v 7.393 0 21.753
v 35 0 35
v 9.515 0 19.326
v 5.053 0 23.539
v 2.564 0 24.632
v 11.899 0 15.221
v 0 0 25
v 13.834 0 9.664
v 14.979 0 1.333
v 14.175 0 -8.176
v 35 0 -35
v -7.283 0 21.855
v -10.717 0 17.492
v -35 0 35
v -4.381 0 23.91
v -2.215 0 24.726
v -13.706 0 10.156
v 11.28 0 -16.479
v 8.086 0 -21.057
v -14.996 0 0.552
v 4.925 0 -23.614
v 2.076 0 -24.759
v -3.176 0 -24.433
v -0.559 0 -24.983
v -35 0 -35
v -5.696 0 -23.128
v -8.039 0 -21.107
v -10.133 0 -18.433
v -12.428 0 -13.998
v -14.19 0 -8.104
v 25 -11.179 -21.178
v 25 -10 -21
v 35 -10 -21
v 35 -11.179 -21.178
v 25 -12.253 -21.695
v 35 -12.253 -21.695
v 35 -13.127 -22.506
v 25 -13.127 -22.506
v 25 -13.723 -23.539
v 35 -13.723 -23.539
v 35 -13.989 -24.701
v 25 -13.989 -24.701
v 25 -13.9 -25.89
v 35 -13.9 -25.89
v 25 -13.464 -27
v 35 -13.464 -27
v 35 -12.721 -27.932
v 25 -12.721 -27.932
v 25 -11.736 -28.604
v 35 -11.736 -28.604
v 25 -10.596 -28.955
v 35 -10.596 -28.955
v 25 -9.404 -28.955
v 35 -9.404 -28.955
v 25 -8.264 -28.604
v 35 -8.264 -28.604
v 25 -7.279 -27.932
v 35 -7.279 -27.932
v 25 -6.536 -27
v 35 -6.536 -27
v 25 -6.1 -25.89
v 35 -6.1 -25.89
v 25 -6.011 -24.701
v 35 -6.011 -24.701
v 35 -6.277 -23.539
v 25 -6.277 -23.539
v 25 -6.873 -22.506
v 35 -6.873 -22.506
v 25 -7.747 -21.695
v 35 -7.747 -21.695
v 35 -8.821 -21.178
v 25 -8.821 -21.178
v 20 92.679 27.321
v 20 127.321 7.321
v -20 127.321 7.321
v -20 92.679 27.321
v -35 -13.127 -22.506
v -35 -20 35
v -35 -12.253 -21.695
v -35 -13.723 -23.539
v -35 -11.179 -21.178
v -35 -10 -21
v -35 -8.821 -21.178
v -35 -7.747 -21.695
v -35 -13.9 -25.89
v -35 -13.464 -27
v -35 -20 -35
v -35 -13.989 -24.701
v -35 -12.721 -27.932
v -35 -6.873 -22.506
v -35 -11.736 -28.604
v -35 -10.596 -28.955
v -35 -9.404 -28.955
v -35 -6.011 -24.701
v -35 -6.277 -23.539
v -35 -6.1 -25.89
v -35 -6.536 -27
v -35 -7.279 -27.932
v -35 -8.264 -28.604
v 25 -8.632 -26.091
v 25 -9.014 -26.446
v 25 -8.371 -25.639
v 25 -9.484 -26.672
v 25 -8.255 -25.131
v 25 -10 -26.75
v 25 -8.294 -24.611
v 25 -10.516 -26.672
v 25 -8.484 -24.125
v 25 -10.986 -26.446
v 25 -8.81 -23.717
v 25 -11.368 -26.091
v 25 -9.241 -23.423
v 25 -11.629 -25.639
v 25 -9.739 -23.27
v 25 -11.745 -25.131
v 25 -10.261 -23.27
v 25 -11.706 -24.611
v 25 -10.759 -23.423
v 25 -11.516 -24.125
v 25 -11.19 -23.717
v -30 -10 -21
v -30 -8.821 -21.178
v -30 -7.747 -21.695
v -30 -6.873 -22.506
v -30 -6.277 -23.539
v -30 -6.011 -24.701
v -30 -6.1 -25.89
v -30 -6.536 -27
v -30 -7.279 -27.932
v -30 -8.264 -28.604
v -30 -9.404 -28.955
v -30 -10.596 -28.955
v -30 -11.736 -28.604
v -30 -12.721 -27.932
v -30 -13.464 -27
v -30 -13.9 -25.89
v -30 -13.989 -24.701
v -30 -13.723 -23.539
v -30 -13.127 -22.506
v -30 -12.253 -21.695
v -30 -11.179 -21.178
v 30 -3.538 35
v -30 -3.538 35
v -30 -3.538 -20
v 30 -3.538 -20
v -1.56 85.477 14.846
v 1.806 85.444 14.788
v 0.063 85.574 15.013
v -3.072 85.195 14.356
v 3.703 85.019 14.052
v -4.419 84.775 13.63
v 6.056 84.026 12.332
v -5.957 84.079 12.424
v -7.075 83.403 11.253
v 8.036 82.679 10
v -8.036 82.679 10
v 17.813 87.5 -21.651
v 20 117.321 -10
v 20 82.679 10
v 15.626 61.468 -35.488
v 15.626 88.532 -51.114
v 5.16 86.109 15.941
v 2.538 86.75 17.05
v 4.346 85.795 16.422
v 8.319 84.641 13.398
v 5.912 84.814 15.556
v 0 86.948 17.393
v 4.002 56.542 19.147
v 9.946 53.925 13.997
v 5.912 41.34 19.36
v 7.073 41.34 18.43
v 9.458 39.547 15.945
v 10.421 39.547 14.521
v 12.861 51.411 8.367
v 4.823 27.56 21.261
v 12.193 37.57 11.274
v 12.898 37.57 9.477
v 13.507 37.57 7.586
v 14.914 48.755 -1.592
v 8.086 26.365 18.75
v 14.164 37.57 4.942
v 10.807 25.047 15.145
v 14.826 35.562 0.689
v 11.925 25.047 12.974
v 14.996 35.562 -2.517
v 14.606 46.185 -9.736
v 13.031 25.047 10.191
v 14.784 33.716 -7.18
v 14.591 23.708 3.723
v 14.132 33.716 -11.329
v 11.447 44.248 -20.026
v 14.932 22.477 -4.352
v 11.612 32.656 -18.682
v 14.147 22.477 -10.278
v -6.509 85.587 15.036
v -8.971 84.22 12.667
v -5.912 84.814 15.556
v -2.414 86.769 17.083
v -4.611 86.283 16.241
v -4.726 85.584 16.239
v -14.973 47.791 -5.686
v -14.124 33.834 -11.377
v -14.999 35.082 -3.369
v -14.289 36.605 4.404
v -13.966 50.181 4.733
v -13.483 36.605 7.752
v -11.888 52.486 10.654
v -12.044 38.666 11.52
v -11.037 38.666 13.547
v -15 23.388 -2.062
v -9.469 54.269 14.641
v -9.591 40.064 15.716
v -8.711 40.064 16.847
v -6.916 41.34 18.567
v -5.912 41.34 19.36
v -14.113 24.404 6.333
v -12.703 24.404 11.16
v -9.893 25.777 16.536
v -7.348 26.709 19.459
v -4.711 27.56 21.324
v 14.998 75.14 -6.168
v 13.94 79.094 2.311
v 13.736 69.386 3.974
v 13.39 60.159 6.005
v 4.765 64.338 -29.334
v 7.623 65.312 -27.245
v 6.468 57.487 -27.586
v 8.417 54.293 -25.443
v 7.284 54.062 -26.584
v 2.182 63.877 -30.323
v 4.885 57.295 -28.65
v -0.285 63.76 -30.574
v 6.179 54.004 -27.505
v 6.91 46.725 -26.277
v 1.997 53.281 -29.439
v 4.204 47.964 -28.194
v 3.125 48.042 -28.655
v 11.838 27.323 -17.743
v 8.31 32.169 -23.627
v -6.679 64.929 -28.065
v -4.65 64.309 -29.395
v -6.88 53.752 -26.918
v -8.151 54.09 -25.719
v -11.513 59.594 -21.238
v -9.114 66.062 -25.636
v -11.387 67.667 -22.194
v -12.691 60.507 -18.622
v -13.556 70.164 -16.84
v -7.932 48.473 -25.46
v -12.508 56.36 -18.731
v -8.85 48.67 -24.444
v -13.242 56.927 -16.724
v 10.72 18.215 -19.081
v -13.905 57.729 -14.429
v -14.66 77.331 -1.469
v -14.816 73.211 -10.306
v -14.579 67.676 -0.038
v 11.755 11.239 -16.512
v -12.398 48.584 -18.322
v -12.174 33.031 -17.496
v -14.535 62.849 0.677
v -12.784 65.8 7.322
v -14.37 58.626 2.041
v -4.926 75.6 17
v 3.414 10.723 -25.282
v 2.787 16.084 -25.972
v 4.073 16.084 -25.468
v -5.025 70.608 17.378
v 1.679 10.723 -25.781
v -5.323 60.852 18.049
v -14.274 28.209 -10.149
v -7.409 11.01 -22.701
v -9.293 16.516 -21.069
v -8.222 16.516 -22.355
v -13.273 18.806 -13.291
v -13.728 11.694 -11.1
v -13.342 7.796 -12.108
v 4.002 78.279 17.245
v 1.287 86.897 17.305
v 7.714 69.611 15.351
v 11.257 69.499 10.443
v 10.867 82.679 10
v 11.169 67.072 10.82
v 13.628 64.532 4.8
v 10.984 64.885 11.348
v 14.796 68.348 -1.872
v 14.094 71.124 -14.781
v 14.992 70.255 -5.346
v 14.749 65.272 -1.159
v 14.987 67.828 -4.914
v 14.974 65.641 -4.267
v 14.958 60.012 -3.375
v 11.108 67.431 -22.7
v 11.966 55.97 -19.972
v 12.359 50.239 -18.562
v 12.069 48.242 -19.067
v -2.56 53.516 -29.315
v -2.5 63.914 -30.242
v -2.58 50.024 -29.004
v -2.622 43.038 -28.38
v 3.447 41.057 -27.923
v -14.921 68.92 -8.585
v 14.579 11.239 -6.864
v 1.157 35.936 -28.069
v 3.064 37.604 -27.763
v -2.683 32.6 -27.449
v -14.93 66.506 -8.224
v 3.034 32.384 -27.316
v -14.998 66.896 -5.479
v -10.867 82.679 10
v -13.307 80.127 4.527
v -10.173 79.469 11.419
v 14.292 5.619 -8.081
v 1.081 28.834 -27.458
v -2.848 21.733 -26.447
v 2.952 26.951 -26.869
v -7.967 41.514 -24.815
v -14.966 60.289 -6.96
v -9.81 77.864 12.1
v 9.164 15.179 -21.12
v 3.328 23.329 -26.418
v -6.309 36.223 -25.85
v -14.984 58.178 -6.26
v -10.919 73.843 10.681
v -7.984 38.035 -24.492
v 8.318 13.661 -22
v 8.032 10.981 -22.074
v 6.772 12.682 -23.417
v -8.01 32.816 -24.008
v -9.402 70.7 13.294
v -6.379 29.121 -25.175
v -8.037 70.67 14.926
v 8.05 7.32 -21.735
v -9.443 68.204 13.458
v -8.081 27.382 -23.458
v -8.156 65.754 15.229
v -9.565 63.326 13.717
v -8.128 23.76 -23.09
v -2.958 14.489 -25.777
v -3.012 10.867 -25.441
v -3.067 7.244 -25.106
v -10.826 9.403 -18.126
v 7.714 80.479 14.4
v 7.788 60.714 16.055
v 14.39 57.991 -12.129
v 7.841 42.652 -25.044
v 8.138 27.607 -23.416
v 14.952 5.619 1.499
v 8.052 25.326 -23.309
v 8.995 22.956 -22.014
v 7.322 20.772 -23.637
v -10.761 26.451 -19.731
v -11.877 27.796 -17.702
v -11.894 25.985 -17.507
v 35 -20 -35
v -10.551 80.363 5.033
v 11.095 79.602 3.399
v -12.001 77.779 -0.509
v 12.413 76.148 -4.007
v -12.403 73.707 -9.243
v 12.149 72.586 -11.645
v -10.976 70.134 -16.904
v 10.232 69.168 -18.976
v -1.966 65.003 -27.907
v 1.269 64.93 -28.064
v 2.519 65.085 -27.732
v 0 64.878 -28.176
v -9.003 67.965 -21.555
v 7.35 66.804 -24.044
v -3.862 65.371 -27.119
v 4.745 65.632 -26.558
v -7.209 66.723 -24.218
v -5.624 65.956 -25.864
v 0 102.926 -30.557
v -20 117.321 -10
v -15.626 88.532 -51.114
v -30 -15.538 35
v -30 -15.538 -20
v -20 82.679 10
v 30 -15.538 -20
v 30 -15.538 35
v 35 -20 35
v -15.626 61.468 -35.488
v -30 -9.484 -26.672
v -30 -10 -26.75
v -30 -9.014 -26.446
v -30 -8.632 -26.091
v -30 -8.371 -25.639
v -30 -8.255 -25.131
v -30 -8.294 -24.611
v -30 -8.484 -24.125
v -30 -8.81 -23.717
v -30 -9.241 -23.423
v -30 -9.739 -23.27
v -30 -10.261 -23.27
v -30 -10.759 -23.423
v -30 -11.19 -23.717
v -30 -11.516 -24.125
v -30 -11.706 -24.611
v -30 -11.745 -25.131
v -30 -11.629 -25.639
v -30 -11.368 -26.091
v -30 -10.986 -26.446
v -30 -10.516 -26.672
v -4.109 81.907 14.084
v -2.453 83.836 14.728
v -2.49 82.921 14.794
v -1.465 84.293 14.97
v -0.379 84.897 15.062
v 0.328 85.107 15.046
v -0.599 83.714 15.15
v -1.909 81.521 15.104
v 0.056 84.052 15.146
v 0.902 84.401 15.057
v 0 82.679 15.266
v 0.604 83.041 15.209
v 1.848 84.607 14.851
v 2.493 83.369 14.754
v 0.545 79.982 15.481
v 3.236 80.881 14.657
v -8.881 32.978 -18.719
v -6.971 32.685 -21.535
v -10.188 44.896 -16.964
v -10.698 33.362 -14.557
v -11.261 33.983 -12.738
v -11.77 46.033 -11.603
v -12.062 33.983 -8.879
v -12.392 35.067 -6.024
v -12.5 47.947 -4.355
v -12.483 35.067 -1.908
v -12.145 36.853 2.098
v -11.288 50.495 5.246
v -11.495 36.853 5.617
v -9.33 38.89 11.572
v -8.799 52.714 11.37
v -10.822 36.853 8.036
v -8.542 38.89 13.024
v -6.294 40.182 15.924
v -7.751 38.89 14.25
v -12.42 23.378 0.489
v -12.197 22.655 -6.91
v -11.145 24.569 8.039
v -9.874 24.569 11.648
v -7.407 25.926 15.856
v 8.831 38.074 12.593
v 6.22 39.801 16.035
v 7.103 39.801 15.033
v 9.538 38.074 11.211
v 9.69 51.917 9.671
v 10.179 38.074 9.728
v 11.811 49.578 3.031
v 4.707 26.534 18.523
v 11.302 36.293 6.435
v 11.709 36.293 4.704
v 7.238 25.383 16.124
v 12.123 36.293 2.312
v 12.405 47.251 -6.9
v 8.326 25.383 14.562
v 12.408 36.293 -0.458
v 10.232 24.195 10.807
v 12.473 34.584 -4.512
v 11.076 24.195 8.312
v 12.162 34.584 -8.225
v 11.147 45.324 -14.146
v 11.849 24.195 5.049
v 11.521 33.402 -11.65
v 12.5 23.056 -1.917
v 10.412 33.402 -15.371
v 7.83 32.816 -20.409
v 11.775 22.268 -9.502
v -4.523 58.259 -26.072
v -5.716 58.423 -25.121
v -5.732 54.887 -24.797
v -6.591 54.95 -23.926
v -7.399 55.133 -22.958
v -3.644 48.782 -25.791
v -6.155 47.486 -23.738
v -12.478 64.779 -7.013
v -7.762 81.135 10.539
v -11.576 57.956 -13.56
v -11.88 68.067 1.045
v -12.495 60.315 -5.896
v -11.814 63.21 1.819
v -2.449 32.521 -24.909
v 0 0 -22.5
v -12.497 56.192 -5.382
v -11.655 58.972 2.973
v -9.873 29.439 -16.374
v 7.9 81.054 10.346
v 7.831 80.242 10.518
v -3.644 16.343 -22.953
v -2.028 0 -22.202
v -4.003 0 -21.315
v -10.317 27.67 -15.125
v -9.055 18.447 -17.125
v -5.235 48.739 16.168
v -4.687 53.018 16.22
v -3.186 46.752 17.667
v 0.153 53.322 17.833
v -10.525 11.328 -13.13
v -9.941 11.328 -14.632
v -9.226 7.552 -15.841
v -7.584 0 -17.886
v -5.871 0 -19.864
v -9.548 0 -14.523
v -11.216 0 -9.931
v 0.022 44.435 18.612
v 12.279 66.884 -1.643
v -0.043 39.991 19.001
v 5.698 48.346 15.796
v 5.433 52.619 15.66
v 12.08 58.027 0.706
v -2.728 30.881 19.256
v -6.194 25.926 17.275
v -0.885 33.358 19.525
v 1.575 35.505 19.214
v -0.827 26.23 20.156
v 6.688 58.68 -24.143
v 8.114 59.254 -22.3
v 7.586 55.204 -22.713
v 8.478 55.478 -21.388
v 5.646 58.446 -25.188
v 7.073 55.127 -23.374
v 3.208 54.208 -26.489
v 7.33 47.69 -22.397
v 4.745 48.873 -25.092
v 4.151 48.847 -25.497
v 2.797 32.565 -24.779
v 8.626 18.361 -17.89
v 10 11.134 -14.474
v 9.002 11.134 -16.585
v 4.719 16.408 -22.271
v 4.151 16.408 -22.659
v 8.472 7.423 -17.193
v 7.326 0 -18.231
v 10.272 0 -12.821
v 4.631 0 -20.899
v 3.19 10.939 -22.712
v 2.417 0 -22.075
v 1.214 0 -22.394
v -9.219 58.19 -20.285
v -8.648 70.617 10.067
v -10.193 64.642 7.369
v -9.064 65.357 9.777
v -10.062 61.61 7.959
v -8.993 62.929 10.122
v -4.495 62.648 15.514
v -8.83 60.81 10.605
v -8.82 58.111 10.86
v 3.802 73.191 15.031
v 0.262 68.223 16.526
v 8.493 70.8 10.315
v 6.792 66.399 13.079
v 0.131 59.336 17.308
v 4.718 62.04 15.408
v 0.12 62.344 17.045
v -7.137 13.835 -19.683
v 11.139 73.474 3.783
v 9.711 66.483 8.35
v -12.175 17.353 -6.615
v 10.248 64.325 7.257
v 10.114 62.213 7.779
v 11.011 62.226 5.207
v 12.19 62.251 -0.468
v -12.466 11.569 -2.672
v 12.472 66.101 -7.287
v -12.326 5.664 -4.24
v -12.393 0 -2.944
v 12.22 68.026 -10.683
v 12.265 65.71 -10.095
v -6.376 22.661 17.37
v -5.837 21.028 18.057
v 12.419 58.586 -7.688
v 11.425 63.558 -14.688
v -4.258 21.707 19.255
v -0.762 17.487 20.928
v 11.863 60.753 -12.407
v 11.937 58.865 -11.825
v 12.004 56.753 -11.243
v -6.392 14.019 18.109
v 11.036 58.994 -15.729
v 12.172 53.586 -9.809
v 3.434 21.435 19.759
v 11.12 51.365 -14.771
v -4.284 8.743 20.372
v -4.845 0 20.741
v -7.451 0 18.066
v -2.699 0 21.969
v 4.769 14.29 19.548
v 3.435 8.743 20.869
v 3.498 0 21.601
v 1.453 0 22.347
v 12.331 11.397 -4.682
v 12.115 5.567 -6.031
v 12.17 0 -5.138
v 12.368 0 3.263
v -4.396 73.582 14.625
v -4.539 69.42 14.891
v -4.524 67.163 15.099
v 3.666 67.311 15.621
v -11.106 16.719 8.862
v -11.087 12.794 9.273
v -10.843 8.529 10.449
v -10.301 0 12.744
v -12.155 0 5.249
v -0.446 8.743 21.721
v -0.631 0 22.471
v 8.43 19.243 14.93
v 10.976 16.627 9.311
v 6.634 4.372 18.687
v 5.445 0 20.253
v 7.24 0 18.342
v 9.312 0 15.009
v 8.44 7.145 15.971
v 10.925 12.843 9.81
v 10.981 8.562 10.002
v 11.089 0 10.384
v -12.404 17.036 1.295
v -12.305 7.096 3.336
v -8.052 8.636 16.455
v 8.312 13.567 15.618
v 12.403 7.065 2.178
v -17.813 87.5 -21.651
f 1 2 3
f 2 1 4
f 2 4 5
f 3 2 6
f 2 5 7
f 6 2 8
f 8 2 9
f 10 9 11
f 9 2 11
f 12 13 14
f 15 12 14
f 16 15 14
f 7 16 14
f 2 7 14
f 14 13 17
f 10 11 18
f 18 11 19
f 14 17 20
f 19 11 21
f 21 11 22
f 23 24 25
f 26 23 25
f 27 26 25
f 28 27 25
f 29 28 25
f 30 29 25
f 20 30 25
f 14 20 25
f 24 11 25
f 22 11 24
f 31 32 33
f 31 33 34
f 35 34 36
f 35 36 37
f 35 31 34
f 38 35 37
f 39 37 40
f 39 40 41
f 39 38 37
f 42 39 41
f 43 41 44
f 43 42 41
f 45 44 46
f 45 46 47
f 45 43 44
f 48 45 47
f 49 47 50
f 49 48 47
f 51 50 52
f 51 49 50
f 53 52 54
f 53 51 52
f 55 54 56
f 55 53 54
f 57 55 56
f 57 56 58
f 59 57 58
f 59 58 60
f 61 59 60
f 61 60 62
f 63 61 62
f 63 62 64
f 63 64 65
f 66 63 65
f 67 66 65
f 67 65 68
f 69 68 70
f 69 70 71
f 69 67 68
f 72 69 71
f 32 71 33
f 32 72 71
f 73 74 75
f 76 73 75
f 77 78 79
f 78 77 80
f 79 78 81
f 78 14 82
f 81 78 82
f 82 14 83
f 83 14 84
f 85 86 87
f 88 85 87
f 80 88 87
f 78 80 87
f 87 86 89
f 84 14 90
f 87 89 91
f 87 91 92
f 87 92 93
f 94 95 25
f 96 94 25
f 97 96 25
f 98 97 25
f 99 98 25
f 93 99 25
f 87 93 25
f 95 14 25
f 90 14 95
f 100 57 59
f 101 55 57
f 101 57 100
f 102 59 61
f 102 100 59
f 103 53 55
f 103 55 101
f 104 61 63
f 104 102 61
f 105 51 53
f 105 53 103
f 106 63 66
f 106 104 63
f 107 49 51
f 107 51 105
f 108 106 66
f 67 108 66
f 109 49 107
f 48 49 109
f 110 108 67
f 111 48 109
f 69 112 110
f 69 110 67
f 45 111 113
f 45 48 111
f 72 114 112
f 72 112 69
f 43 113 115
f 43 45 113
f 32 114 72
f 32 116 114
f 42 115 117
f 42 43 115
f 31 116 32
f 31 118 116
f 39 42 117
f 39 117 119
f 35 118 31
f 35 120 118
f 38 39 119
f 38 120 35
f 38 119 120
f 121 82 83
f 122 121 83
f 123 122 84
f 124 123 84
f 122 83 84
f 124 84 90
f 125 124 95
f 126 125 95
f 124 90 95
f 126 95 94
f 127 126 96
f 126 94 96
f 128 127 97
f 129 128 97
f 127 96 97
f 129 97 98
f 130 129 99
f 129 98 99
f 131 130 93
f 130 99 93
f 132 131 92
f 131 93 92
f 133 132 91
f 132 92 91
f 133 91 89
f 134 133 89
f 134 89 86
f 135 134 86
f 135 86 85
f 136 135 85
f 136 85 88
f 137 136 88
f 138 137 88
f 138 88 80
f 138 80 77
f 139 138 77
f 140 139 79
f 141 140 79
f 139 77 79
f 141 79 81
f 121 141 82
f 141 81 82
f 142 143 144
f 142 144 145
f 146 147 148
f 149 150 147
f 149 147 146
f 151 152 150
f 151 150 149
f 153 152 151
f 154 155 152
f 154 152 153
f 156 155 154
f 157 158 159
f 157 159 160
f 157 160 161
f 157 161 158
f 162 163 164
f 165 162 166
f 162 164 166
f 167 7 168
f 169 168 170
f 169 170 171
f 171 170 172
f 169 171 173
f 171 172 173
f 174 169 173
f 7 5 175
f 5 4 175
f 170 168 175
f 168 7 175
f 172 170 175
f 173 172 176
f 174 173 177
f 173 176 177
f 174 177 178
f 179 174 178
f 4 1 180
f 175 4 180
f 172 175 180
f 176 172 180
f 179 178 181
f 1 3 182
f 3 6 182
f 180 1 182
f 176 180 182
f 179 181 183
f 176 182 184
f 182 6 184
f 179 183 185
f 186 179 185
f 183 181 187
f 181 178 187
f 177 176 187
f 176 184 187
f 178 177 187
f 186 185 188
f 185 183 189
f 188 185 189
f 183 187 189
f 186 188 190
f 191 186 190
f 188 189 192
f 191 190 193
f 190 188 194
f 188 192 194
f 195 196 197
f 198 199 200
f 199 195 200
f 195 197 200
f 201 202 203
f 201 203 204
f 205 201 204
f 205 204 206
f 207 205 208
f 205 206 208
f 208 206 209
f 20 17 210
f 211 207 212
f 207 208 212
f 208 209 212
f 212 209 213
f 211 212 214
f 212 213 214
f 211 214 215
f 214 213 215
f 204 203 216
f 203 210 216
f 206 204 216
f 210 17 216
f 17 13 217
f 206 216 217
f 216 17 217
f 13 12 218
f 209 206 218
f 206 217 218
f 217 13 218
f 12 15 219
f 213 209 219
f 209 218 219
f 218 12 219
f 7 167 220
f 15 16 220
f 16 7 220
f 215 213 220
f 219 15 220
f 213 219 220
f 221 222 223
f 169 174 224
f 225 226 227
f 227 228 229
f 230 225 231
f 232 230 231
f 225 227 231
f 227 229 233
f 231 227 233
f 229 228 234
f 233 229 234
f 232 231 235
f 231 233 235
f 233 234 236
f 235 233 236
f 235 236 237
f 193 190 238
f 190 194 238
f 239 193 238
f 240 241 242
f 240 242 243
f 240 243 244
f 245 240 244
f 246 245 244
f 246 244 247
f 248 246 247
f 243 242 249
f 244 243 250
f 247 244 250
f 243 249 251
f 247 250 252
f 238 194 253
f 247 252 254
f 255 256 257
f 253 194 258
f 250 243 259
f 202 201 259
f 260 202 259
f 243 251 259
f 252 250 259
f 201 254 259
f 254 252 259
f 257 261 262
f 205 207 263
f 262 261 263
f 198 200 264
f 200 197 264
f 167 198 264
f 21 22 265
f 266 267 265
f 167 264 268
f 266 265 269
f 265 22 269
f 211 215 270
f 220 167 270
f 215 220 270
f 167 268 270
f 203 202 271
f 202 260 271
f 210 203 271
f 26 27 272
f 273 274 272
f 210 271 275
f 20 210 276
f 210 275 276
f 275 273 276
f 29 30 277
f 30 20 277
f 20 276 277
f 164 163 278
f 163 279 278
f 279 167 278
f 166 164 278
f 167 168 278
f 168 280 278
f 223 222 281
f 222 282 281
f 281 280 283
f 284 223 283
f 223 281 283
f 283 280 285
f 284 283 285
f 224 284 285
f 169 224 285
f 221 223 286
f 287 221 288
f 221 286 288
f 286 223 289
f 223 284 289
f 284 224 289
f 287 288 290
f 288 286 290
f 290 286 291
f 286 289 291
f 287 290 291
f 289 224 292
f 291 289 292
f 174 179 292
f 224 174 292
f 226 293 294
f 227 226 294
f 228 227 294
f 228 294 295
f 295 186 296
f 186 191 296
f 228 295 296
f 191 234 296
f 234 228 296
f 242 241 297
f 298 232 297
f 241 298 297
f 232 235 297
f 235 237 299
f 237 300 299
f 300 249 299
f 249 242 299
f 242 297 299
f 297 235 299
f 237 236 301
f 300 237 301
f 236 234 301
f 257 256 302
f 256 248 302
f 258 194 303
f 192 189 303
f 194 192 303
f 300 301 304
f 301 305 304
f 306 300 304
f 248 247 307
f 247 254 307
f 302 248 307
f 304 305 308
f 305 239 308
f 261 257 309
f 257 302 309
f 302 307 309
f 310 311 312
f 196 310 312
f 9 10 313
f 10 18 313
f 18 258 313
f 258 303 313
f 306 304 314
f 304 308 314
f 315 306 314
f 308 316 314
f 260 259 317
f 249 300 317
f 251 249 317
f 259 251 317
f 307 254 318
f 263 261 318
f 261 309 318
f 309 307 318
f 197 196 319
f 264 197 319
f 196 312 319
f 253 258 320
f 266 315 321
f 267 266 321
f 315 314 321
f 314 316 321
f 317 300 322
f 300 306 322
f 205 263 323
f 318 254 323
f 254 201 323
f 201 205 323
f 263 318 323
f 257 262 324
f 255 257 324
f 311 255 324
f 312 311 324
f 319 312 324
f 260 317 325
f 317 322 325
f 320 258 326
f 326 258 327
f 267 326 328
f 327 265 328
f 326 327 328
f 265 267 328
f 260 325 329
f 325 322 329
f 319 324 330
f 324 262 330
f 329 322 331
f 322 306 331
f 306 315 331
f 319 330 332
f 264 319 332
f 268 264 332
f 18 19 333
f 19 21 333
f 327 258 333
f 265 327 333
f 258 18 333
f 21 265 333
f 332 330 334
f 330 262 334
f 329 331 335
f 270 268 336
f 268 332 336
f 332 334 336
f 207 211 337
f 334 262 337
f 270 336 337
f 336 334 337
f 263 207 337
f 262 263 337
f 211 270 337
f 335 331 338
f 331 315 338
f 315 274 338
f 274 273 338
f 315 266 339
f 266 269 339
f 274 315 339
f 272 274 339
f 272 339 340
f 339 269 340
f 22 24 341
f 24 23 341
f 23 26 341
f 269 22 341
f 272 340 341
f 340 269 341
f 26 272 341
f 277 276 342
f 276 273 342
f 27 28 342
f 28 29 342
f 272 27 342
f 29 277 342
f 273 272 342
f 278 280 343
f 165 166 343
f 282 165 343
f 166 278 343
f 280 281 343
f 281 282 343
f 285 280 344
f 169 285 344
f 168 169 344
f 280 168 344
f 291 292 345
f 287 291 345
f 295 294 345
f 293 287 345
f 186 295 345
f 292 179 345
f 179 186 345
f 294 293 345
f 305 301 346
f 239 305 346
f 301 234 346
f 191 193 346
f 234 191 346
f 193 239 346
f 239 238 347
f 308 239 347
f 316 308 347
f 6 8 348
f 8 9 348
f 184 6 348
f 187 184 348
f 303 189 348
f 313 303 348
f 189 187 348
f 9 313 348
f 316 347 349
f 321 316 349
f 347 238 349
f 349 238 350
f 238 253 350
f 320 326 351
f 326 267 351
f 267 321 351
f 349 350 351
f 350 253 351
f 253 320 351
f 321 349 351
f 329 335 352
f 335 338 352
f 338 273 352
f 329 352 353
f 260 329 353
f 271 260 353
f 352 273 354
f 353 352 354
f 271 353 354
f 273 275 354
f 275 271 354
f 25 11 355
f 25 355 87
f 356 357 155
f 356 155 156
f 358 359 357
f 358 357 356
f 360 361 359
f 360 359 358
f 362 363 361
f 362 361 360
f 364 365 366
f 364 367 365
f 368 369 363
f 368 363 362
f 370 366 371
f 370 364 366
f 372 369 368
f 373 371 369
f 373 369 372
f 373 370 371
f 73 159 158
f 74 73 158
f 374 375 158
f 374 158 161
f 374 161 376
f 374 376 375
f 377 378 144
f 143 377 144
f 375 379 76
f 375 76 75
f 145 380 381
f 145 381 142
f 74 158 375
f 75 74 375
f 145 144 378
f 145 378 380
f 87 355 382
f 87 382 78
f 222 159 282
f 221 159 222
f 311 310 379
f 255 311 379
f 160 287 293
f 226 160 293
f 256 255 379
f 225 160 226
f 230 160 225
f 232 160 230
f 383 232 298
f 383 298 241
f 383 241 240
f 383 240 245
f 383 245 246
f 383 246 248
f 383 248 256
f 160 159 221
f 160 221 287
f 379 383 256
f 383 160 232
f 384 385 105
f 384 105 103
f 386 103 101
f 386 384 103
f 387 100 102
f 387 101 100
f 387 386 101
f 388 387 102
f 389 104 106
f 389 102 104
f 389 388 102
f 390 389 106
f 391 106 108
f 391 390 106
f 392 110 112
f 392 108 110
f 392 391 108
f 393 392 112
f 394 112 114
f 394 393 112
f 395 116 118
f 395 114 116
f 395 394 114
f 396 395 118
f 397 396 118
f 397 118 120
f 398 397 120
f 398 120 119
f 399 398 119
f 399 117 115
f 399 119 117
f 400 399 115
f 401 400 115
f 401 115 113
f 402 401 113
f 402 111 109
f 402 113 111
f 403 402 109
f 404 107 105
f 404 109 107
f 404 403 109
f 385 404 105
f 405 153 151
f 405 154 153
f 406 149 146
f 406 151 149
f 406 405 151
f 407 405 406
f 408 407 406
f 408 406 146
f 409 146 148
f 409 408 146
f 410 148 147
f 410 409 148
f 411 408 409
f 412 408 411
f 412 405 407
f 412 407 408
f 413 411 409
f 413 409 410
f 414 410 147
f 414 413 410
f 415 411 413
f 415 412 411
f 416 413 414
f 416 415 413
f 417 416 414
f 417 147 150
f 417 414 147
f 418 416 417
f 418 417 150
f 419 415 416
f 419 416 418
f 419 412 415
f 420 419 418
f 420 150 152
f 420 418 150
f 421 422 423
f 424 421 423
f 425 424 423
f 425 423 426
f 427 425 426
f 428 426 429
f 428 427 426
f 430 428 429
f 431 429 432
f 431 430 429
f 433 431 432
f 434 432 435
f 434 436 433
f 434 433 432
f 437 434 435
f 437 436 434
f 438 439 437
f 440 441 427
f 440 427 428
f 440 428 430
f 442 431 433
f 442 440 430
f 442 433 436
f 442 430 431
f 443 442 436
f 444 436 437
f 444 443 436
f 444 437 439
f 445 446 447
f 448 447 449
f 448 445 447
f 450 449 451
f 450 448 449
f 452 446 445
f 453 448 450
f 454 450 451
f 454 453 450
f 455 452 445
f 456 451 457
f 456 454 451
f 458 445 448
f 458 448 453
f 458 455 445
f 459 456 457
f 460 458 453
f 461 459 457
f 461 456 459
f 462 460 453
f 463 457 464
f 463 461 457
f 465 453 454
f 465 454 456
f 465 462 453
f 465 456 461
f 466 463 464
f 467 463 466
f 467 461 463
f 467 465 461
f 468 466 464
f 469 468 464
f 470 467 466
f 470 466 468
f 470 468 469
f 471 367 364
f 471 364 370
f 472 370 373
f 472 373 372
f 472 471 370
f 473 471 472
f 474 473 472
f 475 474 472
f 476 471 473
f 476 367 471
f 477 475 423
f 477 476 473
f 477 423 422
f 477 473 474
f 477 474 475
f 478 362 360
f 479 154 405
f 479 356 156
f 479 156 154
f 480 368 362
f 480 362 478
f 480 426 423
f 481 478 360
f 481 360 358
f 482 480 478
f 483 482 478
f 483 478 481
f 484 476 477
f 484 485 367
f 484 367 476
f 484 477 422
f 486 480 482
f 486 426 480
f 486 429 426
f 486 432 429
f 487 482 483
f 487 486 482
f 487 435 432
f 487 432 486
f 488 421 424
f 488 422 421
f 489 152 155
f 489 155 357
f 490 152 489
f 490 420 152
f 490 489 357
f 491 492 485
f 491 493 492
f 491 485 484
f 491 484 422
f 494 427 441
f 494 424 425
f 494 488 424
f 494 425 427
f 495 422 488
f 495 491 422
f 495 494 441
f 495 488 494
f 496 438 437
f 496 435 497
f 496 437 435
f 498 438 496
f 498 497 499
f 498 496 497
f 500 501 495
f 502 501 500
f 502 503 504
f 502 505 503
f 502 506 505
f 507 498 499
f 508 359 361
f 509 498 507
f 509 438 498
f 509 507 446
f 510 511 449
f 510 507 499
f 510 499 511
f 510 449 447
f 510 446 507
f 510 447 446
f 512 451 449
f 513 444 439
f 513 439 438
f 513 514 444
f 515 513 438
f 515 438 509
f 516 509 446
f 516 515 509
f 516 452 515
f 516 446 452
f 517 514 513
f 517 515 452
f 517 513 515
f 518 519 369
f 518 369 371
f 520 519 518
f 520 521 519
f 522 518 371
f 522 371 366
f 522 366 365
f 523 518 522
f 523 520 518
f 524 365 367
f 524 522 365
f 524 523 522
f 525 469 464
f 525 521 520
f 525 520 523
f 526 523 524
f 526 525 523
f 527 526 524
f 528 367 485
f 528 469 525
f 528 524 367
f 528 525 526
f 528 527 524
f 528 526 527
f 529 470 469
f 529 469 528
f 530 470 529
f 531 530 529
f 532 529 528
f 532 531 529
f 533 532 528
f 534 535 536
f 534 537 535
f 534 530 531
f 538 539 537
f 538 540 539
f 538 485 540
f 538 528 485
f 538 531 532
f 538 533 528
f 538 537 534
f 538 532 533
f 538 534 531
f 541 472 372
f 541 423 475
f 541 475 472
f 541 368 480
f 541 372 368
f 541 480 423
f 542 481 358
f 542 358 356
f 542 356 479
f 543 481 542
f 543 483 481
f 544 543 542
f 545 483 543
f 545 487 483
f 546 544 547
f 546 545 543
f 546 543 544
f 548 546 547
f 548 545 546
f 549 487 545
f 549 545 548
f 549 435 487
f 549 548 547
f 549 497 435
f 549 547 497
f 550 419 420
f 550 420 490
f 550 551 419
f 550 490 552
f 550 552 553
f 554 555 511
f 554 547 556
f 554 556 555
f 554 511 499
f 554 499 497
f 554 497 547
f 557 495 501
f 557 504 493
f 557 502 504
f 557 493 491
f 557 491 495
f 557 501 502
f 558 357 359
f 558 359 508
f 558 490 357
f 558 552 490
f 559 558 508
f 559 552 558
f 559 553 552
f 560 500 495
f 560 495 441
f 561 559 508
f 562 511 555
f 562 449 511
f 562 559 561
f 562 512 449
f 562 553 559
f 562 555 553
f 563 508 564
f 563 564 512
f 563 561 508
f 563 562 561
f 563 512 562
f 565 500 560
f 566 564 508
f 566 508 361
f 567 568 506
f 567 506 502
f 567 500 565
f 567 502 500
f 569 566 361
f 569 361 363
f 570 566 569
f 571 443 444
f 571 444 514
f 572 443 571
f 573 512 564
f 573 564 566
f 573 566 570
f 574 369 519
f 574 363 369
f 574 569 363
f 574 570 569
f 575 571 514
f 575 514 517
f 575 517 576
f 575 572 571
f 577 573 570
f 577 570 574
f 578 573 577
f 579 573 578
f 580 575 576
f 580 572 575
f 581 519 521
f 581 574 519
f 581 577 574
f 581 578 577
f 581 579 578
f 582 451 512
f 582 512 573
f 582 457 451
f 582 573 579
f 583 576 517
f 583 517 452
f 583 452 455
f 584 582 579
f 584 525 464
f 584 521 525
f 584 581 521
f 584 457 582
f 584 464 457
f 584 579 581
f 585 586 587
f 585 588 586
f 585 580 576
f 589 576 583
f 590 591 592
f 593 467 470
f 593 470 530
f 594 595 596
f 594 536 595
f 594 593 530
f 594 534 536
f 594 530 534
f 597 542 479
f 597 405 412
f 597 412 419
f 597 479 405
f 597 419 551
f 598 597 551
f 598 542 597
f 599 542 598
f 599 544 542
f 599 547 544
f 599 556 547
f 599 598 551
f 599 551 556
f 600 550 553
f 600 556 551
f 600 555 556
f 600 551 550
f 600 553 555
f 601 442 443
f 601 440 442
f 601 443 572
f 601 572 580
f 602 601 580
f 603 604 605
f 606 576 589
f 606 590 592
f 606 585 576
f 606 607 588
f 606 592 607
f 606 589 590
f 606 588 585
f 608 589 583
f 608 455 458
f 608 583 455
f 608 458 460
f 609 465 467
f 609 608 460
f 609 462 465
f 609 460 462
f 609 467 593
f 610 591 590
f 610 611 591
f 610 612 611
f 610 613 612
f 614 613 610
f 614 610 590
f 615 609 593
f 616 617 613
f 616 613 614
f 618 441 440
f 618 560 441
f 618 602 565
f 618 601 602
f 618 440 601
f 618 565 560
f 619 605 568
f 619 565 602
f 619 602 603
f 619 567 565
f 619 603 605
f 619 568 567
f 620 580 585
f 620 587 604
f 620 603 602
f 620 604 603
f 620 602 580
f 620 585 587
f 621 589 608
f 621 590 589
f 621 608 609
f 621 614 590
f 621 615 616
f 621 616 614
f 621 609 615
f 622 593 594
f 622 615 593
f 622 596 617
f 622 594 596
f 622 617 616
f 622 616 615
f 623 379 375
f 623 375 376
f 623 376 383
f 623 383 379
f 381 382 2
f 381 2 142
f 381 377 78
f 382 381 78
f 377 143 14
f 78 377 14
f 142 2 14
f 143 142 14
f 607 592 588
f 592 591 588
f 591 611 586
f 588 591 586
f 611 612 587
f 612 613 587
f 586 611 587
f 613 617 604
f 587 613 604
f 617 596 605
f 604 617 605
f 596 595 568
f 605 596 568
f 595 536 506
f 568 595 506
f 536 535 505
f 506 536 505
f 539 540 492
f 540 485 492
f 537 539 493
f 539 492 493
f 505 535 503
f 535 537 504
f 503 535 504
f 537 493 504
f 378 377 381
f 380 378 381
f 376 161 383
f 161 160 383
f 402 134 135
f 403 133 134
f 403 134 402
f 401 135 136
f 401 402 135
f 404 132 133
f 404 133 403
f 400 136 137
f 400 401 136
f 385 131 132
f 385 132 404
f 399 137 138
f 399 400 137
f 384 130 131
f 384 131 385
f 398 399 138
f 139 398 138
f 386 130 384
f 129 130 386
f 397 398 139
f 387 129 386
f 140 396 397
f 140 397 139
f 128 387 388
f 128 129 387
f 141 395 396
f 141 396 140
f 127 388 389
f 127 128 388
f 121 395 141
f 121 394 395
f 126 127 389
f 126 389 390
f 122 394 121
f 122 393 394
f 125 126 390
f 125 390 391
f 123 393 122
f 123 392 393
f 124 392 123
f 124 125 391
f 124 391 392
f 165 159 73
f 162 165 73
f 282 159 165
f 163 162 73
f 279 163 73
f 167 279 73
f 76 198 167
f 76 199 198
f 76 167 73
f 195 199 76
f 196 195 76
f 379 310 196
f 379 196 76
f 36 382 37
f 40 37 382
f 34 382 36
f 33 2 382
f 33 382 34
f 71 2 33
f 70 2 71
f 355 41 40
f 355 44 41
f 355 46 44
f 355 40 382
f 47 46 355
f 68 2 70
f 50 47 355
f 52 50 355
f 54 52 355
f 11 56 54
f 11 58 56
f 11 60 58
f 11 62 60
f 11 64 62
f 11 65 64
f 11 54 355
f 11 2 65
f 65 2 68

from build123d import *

# Parameters (mm, degrees)
SKETCH2_RX                    = 25
SKETCH2_RY                    = 15
SKETCH2_RX_2                  = 22.5
SKETCH2_RY_2                  = 12.5
BOSS_EXTRUDE1_DEPTH           = 100
SKETCH8_W                     = 40
SKETCH8_H                     = 40
BOSS_EXTRUDE2_DEPTH           = 20
BOSS_EXTRUDE2_OTHER_WAY_DEPTH = 50
BOSS_EXTRUDE2_OTHER_WAY_TAPER = 5
SKETCH9_W                     = 70
SKETCH9_H                     = 70
BOSS_EXTRUDE3_DEPTH           = 20
SKETCH10_W                    = 60
SKETCH10_H                    = 12
CUT_EXTRUDE1_DEPTH            = 55
CUT_EXTRUDE2_DEPTH            = 155.023239358
CUT_EXTRUDE2_DEPTH_BACK       = 155.023239358
SKETCH11_R                    = 1.75
SKETCH13_R                    = 4
CUT_EXTRUDE3_DEPTH            = 5
CUT_EXTRUDE4_START            = -10
SKETCH14_R                    = 4
CUT_EXTRUDE4_DEPTH            = 10


with BuildPart() as part:
    # Sketch2 → Boss-Extrude1 (new, along a direction that is not the sketch's normal)
    with BuildSketch(Plane(origin=(0, 0, 0), x_dir=(1, 0, 0), z_dir=(0, 1, 0))):
        with Locations(Location((0, 0), (0, 0, -90))):
            Ellipse(SKETCH2_RX, SKETCH2_RY)
        with Locations(Location((0, 0), (0, 0, 90))):
            Ellipse(SKETCH2_RX_2, SKETCH2_RY_2, mode=Mode.SUBTRACT)
    extrude(amount=BOSS_EXTRUDE1_DEPTH, dir=(0, 0.9961946980917453, -0.08715574274766182))

    # Sketch8 → Boss-Extrude2 (add)
    with BuildSketch(Plane(origin=(0, 25, 43.301270189), x_dir=(-1, 0, 0), z_dir=(0, -0.5000000000000041, -0.8660254037844364))):
        with Locations((0, 86.602540378)):
            Rectangle(SKETCH8_W, SKETCH8_H)
    extrude(amount=-BOSS_EXTRUDE2_DEPTH)

    # Sketch8 → Boss-Extrude2 other way (add)
    with BuildSketch(Plane(origin=(0, 25, 43.301270189), x_dir=(-1, 0, 0), z_dir=(0, -0.5000000000000041, -0.8660254037844364))):
        with Locations((0, 86.602540378)):
            Rectangle(SKETCH8_W, SKETCH8_H)
    extrude(amount=BOSS_EXTRUDE2_OTHER_WAY_DEPTH, taper=BOSS_EXTRUDE2_OTHER_WAY_TAPER)

    # Sketch9 → Boss-Extrude3 (add)
    with BuildSketch(Plane(origin=(0, 0, 0), x_dir=(-1, 0, 0), z_dir=(0, -1, 0))):
        Rectangle(SKETCH9_W, SKETCH9_H)
    extrude(amount=BOSS_EXTRUDE3_DEPTH)

    # Sketch10 → Cut-Extrude1 (cut)
    with BuildSketch(Plane.XY.offset(35)):
        with Locations((0, -9.537809852)):
            Rectangle(SKETCH10_W, SKETCH10_H)
    extrude(amount=-CUT_EXTRUDE1_DEPTH, mode=Mode.SUBTRACT)

    # Sketch11 → Cut-Extrude2 (cut, two sides: drawn at the far end of the back side and taken through both)
    with BuildSketch(Plane(origin=(35, 0, 0), x_dir=(0, 0, -1), z_dir=(1, 0, 0)).offset(-CUT_EXTRUDE2_DEPTH_BACK)):
        with Locations((25, -10)):
            Circle(SKETCH11_R)
    extrude(amount=CUT_EXTRUDE2_DEPTH + CUT_EXTRUDE2_DEPTH_BACK, mode=Mode.SUBTRACT)

    # Sketch13 → Cut-Extrude3 (cut)
    with BuildSketch(Plane.ZY.offset(35)):
        with Locations((-25, -10)):
            Circle(SKETCH13_R)
    extrude(amount=-CUT_EXTRUDE3_DEPTH, mode=Mode.SUBTRACT)

    # Sketch14 → Cut-Extrude4 (cut)
    with BuildSketch(Plane(origin=(35, 0, 0), x_dir=(0, 0, -1), z_dir=(1, 0, 0)).offset(CUT_EXTRUDE4_START)):
        with Locations((25, -10)):
            Circle(SKETCH14_R)
    extrude(amount=CUT_EXTRUDE4_DEPTH, mode=Mode.SUBTRACT)


solid = part.part
